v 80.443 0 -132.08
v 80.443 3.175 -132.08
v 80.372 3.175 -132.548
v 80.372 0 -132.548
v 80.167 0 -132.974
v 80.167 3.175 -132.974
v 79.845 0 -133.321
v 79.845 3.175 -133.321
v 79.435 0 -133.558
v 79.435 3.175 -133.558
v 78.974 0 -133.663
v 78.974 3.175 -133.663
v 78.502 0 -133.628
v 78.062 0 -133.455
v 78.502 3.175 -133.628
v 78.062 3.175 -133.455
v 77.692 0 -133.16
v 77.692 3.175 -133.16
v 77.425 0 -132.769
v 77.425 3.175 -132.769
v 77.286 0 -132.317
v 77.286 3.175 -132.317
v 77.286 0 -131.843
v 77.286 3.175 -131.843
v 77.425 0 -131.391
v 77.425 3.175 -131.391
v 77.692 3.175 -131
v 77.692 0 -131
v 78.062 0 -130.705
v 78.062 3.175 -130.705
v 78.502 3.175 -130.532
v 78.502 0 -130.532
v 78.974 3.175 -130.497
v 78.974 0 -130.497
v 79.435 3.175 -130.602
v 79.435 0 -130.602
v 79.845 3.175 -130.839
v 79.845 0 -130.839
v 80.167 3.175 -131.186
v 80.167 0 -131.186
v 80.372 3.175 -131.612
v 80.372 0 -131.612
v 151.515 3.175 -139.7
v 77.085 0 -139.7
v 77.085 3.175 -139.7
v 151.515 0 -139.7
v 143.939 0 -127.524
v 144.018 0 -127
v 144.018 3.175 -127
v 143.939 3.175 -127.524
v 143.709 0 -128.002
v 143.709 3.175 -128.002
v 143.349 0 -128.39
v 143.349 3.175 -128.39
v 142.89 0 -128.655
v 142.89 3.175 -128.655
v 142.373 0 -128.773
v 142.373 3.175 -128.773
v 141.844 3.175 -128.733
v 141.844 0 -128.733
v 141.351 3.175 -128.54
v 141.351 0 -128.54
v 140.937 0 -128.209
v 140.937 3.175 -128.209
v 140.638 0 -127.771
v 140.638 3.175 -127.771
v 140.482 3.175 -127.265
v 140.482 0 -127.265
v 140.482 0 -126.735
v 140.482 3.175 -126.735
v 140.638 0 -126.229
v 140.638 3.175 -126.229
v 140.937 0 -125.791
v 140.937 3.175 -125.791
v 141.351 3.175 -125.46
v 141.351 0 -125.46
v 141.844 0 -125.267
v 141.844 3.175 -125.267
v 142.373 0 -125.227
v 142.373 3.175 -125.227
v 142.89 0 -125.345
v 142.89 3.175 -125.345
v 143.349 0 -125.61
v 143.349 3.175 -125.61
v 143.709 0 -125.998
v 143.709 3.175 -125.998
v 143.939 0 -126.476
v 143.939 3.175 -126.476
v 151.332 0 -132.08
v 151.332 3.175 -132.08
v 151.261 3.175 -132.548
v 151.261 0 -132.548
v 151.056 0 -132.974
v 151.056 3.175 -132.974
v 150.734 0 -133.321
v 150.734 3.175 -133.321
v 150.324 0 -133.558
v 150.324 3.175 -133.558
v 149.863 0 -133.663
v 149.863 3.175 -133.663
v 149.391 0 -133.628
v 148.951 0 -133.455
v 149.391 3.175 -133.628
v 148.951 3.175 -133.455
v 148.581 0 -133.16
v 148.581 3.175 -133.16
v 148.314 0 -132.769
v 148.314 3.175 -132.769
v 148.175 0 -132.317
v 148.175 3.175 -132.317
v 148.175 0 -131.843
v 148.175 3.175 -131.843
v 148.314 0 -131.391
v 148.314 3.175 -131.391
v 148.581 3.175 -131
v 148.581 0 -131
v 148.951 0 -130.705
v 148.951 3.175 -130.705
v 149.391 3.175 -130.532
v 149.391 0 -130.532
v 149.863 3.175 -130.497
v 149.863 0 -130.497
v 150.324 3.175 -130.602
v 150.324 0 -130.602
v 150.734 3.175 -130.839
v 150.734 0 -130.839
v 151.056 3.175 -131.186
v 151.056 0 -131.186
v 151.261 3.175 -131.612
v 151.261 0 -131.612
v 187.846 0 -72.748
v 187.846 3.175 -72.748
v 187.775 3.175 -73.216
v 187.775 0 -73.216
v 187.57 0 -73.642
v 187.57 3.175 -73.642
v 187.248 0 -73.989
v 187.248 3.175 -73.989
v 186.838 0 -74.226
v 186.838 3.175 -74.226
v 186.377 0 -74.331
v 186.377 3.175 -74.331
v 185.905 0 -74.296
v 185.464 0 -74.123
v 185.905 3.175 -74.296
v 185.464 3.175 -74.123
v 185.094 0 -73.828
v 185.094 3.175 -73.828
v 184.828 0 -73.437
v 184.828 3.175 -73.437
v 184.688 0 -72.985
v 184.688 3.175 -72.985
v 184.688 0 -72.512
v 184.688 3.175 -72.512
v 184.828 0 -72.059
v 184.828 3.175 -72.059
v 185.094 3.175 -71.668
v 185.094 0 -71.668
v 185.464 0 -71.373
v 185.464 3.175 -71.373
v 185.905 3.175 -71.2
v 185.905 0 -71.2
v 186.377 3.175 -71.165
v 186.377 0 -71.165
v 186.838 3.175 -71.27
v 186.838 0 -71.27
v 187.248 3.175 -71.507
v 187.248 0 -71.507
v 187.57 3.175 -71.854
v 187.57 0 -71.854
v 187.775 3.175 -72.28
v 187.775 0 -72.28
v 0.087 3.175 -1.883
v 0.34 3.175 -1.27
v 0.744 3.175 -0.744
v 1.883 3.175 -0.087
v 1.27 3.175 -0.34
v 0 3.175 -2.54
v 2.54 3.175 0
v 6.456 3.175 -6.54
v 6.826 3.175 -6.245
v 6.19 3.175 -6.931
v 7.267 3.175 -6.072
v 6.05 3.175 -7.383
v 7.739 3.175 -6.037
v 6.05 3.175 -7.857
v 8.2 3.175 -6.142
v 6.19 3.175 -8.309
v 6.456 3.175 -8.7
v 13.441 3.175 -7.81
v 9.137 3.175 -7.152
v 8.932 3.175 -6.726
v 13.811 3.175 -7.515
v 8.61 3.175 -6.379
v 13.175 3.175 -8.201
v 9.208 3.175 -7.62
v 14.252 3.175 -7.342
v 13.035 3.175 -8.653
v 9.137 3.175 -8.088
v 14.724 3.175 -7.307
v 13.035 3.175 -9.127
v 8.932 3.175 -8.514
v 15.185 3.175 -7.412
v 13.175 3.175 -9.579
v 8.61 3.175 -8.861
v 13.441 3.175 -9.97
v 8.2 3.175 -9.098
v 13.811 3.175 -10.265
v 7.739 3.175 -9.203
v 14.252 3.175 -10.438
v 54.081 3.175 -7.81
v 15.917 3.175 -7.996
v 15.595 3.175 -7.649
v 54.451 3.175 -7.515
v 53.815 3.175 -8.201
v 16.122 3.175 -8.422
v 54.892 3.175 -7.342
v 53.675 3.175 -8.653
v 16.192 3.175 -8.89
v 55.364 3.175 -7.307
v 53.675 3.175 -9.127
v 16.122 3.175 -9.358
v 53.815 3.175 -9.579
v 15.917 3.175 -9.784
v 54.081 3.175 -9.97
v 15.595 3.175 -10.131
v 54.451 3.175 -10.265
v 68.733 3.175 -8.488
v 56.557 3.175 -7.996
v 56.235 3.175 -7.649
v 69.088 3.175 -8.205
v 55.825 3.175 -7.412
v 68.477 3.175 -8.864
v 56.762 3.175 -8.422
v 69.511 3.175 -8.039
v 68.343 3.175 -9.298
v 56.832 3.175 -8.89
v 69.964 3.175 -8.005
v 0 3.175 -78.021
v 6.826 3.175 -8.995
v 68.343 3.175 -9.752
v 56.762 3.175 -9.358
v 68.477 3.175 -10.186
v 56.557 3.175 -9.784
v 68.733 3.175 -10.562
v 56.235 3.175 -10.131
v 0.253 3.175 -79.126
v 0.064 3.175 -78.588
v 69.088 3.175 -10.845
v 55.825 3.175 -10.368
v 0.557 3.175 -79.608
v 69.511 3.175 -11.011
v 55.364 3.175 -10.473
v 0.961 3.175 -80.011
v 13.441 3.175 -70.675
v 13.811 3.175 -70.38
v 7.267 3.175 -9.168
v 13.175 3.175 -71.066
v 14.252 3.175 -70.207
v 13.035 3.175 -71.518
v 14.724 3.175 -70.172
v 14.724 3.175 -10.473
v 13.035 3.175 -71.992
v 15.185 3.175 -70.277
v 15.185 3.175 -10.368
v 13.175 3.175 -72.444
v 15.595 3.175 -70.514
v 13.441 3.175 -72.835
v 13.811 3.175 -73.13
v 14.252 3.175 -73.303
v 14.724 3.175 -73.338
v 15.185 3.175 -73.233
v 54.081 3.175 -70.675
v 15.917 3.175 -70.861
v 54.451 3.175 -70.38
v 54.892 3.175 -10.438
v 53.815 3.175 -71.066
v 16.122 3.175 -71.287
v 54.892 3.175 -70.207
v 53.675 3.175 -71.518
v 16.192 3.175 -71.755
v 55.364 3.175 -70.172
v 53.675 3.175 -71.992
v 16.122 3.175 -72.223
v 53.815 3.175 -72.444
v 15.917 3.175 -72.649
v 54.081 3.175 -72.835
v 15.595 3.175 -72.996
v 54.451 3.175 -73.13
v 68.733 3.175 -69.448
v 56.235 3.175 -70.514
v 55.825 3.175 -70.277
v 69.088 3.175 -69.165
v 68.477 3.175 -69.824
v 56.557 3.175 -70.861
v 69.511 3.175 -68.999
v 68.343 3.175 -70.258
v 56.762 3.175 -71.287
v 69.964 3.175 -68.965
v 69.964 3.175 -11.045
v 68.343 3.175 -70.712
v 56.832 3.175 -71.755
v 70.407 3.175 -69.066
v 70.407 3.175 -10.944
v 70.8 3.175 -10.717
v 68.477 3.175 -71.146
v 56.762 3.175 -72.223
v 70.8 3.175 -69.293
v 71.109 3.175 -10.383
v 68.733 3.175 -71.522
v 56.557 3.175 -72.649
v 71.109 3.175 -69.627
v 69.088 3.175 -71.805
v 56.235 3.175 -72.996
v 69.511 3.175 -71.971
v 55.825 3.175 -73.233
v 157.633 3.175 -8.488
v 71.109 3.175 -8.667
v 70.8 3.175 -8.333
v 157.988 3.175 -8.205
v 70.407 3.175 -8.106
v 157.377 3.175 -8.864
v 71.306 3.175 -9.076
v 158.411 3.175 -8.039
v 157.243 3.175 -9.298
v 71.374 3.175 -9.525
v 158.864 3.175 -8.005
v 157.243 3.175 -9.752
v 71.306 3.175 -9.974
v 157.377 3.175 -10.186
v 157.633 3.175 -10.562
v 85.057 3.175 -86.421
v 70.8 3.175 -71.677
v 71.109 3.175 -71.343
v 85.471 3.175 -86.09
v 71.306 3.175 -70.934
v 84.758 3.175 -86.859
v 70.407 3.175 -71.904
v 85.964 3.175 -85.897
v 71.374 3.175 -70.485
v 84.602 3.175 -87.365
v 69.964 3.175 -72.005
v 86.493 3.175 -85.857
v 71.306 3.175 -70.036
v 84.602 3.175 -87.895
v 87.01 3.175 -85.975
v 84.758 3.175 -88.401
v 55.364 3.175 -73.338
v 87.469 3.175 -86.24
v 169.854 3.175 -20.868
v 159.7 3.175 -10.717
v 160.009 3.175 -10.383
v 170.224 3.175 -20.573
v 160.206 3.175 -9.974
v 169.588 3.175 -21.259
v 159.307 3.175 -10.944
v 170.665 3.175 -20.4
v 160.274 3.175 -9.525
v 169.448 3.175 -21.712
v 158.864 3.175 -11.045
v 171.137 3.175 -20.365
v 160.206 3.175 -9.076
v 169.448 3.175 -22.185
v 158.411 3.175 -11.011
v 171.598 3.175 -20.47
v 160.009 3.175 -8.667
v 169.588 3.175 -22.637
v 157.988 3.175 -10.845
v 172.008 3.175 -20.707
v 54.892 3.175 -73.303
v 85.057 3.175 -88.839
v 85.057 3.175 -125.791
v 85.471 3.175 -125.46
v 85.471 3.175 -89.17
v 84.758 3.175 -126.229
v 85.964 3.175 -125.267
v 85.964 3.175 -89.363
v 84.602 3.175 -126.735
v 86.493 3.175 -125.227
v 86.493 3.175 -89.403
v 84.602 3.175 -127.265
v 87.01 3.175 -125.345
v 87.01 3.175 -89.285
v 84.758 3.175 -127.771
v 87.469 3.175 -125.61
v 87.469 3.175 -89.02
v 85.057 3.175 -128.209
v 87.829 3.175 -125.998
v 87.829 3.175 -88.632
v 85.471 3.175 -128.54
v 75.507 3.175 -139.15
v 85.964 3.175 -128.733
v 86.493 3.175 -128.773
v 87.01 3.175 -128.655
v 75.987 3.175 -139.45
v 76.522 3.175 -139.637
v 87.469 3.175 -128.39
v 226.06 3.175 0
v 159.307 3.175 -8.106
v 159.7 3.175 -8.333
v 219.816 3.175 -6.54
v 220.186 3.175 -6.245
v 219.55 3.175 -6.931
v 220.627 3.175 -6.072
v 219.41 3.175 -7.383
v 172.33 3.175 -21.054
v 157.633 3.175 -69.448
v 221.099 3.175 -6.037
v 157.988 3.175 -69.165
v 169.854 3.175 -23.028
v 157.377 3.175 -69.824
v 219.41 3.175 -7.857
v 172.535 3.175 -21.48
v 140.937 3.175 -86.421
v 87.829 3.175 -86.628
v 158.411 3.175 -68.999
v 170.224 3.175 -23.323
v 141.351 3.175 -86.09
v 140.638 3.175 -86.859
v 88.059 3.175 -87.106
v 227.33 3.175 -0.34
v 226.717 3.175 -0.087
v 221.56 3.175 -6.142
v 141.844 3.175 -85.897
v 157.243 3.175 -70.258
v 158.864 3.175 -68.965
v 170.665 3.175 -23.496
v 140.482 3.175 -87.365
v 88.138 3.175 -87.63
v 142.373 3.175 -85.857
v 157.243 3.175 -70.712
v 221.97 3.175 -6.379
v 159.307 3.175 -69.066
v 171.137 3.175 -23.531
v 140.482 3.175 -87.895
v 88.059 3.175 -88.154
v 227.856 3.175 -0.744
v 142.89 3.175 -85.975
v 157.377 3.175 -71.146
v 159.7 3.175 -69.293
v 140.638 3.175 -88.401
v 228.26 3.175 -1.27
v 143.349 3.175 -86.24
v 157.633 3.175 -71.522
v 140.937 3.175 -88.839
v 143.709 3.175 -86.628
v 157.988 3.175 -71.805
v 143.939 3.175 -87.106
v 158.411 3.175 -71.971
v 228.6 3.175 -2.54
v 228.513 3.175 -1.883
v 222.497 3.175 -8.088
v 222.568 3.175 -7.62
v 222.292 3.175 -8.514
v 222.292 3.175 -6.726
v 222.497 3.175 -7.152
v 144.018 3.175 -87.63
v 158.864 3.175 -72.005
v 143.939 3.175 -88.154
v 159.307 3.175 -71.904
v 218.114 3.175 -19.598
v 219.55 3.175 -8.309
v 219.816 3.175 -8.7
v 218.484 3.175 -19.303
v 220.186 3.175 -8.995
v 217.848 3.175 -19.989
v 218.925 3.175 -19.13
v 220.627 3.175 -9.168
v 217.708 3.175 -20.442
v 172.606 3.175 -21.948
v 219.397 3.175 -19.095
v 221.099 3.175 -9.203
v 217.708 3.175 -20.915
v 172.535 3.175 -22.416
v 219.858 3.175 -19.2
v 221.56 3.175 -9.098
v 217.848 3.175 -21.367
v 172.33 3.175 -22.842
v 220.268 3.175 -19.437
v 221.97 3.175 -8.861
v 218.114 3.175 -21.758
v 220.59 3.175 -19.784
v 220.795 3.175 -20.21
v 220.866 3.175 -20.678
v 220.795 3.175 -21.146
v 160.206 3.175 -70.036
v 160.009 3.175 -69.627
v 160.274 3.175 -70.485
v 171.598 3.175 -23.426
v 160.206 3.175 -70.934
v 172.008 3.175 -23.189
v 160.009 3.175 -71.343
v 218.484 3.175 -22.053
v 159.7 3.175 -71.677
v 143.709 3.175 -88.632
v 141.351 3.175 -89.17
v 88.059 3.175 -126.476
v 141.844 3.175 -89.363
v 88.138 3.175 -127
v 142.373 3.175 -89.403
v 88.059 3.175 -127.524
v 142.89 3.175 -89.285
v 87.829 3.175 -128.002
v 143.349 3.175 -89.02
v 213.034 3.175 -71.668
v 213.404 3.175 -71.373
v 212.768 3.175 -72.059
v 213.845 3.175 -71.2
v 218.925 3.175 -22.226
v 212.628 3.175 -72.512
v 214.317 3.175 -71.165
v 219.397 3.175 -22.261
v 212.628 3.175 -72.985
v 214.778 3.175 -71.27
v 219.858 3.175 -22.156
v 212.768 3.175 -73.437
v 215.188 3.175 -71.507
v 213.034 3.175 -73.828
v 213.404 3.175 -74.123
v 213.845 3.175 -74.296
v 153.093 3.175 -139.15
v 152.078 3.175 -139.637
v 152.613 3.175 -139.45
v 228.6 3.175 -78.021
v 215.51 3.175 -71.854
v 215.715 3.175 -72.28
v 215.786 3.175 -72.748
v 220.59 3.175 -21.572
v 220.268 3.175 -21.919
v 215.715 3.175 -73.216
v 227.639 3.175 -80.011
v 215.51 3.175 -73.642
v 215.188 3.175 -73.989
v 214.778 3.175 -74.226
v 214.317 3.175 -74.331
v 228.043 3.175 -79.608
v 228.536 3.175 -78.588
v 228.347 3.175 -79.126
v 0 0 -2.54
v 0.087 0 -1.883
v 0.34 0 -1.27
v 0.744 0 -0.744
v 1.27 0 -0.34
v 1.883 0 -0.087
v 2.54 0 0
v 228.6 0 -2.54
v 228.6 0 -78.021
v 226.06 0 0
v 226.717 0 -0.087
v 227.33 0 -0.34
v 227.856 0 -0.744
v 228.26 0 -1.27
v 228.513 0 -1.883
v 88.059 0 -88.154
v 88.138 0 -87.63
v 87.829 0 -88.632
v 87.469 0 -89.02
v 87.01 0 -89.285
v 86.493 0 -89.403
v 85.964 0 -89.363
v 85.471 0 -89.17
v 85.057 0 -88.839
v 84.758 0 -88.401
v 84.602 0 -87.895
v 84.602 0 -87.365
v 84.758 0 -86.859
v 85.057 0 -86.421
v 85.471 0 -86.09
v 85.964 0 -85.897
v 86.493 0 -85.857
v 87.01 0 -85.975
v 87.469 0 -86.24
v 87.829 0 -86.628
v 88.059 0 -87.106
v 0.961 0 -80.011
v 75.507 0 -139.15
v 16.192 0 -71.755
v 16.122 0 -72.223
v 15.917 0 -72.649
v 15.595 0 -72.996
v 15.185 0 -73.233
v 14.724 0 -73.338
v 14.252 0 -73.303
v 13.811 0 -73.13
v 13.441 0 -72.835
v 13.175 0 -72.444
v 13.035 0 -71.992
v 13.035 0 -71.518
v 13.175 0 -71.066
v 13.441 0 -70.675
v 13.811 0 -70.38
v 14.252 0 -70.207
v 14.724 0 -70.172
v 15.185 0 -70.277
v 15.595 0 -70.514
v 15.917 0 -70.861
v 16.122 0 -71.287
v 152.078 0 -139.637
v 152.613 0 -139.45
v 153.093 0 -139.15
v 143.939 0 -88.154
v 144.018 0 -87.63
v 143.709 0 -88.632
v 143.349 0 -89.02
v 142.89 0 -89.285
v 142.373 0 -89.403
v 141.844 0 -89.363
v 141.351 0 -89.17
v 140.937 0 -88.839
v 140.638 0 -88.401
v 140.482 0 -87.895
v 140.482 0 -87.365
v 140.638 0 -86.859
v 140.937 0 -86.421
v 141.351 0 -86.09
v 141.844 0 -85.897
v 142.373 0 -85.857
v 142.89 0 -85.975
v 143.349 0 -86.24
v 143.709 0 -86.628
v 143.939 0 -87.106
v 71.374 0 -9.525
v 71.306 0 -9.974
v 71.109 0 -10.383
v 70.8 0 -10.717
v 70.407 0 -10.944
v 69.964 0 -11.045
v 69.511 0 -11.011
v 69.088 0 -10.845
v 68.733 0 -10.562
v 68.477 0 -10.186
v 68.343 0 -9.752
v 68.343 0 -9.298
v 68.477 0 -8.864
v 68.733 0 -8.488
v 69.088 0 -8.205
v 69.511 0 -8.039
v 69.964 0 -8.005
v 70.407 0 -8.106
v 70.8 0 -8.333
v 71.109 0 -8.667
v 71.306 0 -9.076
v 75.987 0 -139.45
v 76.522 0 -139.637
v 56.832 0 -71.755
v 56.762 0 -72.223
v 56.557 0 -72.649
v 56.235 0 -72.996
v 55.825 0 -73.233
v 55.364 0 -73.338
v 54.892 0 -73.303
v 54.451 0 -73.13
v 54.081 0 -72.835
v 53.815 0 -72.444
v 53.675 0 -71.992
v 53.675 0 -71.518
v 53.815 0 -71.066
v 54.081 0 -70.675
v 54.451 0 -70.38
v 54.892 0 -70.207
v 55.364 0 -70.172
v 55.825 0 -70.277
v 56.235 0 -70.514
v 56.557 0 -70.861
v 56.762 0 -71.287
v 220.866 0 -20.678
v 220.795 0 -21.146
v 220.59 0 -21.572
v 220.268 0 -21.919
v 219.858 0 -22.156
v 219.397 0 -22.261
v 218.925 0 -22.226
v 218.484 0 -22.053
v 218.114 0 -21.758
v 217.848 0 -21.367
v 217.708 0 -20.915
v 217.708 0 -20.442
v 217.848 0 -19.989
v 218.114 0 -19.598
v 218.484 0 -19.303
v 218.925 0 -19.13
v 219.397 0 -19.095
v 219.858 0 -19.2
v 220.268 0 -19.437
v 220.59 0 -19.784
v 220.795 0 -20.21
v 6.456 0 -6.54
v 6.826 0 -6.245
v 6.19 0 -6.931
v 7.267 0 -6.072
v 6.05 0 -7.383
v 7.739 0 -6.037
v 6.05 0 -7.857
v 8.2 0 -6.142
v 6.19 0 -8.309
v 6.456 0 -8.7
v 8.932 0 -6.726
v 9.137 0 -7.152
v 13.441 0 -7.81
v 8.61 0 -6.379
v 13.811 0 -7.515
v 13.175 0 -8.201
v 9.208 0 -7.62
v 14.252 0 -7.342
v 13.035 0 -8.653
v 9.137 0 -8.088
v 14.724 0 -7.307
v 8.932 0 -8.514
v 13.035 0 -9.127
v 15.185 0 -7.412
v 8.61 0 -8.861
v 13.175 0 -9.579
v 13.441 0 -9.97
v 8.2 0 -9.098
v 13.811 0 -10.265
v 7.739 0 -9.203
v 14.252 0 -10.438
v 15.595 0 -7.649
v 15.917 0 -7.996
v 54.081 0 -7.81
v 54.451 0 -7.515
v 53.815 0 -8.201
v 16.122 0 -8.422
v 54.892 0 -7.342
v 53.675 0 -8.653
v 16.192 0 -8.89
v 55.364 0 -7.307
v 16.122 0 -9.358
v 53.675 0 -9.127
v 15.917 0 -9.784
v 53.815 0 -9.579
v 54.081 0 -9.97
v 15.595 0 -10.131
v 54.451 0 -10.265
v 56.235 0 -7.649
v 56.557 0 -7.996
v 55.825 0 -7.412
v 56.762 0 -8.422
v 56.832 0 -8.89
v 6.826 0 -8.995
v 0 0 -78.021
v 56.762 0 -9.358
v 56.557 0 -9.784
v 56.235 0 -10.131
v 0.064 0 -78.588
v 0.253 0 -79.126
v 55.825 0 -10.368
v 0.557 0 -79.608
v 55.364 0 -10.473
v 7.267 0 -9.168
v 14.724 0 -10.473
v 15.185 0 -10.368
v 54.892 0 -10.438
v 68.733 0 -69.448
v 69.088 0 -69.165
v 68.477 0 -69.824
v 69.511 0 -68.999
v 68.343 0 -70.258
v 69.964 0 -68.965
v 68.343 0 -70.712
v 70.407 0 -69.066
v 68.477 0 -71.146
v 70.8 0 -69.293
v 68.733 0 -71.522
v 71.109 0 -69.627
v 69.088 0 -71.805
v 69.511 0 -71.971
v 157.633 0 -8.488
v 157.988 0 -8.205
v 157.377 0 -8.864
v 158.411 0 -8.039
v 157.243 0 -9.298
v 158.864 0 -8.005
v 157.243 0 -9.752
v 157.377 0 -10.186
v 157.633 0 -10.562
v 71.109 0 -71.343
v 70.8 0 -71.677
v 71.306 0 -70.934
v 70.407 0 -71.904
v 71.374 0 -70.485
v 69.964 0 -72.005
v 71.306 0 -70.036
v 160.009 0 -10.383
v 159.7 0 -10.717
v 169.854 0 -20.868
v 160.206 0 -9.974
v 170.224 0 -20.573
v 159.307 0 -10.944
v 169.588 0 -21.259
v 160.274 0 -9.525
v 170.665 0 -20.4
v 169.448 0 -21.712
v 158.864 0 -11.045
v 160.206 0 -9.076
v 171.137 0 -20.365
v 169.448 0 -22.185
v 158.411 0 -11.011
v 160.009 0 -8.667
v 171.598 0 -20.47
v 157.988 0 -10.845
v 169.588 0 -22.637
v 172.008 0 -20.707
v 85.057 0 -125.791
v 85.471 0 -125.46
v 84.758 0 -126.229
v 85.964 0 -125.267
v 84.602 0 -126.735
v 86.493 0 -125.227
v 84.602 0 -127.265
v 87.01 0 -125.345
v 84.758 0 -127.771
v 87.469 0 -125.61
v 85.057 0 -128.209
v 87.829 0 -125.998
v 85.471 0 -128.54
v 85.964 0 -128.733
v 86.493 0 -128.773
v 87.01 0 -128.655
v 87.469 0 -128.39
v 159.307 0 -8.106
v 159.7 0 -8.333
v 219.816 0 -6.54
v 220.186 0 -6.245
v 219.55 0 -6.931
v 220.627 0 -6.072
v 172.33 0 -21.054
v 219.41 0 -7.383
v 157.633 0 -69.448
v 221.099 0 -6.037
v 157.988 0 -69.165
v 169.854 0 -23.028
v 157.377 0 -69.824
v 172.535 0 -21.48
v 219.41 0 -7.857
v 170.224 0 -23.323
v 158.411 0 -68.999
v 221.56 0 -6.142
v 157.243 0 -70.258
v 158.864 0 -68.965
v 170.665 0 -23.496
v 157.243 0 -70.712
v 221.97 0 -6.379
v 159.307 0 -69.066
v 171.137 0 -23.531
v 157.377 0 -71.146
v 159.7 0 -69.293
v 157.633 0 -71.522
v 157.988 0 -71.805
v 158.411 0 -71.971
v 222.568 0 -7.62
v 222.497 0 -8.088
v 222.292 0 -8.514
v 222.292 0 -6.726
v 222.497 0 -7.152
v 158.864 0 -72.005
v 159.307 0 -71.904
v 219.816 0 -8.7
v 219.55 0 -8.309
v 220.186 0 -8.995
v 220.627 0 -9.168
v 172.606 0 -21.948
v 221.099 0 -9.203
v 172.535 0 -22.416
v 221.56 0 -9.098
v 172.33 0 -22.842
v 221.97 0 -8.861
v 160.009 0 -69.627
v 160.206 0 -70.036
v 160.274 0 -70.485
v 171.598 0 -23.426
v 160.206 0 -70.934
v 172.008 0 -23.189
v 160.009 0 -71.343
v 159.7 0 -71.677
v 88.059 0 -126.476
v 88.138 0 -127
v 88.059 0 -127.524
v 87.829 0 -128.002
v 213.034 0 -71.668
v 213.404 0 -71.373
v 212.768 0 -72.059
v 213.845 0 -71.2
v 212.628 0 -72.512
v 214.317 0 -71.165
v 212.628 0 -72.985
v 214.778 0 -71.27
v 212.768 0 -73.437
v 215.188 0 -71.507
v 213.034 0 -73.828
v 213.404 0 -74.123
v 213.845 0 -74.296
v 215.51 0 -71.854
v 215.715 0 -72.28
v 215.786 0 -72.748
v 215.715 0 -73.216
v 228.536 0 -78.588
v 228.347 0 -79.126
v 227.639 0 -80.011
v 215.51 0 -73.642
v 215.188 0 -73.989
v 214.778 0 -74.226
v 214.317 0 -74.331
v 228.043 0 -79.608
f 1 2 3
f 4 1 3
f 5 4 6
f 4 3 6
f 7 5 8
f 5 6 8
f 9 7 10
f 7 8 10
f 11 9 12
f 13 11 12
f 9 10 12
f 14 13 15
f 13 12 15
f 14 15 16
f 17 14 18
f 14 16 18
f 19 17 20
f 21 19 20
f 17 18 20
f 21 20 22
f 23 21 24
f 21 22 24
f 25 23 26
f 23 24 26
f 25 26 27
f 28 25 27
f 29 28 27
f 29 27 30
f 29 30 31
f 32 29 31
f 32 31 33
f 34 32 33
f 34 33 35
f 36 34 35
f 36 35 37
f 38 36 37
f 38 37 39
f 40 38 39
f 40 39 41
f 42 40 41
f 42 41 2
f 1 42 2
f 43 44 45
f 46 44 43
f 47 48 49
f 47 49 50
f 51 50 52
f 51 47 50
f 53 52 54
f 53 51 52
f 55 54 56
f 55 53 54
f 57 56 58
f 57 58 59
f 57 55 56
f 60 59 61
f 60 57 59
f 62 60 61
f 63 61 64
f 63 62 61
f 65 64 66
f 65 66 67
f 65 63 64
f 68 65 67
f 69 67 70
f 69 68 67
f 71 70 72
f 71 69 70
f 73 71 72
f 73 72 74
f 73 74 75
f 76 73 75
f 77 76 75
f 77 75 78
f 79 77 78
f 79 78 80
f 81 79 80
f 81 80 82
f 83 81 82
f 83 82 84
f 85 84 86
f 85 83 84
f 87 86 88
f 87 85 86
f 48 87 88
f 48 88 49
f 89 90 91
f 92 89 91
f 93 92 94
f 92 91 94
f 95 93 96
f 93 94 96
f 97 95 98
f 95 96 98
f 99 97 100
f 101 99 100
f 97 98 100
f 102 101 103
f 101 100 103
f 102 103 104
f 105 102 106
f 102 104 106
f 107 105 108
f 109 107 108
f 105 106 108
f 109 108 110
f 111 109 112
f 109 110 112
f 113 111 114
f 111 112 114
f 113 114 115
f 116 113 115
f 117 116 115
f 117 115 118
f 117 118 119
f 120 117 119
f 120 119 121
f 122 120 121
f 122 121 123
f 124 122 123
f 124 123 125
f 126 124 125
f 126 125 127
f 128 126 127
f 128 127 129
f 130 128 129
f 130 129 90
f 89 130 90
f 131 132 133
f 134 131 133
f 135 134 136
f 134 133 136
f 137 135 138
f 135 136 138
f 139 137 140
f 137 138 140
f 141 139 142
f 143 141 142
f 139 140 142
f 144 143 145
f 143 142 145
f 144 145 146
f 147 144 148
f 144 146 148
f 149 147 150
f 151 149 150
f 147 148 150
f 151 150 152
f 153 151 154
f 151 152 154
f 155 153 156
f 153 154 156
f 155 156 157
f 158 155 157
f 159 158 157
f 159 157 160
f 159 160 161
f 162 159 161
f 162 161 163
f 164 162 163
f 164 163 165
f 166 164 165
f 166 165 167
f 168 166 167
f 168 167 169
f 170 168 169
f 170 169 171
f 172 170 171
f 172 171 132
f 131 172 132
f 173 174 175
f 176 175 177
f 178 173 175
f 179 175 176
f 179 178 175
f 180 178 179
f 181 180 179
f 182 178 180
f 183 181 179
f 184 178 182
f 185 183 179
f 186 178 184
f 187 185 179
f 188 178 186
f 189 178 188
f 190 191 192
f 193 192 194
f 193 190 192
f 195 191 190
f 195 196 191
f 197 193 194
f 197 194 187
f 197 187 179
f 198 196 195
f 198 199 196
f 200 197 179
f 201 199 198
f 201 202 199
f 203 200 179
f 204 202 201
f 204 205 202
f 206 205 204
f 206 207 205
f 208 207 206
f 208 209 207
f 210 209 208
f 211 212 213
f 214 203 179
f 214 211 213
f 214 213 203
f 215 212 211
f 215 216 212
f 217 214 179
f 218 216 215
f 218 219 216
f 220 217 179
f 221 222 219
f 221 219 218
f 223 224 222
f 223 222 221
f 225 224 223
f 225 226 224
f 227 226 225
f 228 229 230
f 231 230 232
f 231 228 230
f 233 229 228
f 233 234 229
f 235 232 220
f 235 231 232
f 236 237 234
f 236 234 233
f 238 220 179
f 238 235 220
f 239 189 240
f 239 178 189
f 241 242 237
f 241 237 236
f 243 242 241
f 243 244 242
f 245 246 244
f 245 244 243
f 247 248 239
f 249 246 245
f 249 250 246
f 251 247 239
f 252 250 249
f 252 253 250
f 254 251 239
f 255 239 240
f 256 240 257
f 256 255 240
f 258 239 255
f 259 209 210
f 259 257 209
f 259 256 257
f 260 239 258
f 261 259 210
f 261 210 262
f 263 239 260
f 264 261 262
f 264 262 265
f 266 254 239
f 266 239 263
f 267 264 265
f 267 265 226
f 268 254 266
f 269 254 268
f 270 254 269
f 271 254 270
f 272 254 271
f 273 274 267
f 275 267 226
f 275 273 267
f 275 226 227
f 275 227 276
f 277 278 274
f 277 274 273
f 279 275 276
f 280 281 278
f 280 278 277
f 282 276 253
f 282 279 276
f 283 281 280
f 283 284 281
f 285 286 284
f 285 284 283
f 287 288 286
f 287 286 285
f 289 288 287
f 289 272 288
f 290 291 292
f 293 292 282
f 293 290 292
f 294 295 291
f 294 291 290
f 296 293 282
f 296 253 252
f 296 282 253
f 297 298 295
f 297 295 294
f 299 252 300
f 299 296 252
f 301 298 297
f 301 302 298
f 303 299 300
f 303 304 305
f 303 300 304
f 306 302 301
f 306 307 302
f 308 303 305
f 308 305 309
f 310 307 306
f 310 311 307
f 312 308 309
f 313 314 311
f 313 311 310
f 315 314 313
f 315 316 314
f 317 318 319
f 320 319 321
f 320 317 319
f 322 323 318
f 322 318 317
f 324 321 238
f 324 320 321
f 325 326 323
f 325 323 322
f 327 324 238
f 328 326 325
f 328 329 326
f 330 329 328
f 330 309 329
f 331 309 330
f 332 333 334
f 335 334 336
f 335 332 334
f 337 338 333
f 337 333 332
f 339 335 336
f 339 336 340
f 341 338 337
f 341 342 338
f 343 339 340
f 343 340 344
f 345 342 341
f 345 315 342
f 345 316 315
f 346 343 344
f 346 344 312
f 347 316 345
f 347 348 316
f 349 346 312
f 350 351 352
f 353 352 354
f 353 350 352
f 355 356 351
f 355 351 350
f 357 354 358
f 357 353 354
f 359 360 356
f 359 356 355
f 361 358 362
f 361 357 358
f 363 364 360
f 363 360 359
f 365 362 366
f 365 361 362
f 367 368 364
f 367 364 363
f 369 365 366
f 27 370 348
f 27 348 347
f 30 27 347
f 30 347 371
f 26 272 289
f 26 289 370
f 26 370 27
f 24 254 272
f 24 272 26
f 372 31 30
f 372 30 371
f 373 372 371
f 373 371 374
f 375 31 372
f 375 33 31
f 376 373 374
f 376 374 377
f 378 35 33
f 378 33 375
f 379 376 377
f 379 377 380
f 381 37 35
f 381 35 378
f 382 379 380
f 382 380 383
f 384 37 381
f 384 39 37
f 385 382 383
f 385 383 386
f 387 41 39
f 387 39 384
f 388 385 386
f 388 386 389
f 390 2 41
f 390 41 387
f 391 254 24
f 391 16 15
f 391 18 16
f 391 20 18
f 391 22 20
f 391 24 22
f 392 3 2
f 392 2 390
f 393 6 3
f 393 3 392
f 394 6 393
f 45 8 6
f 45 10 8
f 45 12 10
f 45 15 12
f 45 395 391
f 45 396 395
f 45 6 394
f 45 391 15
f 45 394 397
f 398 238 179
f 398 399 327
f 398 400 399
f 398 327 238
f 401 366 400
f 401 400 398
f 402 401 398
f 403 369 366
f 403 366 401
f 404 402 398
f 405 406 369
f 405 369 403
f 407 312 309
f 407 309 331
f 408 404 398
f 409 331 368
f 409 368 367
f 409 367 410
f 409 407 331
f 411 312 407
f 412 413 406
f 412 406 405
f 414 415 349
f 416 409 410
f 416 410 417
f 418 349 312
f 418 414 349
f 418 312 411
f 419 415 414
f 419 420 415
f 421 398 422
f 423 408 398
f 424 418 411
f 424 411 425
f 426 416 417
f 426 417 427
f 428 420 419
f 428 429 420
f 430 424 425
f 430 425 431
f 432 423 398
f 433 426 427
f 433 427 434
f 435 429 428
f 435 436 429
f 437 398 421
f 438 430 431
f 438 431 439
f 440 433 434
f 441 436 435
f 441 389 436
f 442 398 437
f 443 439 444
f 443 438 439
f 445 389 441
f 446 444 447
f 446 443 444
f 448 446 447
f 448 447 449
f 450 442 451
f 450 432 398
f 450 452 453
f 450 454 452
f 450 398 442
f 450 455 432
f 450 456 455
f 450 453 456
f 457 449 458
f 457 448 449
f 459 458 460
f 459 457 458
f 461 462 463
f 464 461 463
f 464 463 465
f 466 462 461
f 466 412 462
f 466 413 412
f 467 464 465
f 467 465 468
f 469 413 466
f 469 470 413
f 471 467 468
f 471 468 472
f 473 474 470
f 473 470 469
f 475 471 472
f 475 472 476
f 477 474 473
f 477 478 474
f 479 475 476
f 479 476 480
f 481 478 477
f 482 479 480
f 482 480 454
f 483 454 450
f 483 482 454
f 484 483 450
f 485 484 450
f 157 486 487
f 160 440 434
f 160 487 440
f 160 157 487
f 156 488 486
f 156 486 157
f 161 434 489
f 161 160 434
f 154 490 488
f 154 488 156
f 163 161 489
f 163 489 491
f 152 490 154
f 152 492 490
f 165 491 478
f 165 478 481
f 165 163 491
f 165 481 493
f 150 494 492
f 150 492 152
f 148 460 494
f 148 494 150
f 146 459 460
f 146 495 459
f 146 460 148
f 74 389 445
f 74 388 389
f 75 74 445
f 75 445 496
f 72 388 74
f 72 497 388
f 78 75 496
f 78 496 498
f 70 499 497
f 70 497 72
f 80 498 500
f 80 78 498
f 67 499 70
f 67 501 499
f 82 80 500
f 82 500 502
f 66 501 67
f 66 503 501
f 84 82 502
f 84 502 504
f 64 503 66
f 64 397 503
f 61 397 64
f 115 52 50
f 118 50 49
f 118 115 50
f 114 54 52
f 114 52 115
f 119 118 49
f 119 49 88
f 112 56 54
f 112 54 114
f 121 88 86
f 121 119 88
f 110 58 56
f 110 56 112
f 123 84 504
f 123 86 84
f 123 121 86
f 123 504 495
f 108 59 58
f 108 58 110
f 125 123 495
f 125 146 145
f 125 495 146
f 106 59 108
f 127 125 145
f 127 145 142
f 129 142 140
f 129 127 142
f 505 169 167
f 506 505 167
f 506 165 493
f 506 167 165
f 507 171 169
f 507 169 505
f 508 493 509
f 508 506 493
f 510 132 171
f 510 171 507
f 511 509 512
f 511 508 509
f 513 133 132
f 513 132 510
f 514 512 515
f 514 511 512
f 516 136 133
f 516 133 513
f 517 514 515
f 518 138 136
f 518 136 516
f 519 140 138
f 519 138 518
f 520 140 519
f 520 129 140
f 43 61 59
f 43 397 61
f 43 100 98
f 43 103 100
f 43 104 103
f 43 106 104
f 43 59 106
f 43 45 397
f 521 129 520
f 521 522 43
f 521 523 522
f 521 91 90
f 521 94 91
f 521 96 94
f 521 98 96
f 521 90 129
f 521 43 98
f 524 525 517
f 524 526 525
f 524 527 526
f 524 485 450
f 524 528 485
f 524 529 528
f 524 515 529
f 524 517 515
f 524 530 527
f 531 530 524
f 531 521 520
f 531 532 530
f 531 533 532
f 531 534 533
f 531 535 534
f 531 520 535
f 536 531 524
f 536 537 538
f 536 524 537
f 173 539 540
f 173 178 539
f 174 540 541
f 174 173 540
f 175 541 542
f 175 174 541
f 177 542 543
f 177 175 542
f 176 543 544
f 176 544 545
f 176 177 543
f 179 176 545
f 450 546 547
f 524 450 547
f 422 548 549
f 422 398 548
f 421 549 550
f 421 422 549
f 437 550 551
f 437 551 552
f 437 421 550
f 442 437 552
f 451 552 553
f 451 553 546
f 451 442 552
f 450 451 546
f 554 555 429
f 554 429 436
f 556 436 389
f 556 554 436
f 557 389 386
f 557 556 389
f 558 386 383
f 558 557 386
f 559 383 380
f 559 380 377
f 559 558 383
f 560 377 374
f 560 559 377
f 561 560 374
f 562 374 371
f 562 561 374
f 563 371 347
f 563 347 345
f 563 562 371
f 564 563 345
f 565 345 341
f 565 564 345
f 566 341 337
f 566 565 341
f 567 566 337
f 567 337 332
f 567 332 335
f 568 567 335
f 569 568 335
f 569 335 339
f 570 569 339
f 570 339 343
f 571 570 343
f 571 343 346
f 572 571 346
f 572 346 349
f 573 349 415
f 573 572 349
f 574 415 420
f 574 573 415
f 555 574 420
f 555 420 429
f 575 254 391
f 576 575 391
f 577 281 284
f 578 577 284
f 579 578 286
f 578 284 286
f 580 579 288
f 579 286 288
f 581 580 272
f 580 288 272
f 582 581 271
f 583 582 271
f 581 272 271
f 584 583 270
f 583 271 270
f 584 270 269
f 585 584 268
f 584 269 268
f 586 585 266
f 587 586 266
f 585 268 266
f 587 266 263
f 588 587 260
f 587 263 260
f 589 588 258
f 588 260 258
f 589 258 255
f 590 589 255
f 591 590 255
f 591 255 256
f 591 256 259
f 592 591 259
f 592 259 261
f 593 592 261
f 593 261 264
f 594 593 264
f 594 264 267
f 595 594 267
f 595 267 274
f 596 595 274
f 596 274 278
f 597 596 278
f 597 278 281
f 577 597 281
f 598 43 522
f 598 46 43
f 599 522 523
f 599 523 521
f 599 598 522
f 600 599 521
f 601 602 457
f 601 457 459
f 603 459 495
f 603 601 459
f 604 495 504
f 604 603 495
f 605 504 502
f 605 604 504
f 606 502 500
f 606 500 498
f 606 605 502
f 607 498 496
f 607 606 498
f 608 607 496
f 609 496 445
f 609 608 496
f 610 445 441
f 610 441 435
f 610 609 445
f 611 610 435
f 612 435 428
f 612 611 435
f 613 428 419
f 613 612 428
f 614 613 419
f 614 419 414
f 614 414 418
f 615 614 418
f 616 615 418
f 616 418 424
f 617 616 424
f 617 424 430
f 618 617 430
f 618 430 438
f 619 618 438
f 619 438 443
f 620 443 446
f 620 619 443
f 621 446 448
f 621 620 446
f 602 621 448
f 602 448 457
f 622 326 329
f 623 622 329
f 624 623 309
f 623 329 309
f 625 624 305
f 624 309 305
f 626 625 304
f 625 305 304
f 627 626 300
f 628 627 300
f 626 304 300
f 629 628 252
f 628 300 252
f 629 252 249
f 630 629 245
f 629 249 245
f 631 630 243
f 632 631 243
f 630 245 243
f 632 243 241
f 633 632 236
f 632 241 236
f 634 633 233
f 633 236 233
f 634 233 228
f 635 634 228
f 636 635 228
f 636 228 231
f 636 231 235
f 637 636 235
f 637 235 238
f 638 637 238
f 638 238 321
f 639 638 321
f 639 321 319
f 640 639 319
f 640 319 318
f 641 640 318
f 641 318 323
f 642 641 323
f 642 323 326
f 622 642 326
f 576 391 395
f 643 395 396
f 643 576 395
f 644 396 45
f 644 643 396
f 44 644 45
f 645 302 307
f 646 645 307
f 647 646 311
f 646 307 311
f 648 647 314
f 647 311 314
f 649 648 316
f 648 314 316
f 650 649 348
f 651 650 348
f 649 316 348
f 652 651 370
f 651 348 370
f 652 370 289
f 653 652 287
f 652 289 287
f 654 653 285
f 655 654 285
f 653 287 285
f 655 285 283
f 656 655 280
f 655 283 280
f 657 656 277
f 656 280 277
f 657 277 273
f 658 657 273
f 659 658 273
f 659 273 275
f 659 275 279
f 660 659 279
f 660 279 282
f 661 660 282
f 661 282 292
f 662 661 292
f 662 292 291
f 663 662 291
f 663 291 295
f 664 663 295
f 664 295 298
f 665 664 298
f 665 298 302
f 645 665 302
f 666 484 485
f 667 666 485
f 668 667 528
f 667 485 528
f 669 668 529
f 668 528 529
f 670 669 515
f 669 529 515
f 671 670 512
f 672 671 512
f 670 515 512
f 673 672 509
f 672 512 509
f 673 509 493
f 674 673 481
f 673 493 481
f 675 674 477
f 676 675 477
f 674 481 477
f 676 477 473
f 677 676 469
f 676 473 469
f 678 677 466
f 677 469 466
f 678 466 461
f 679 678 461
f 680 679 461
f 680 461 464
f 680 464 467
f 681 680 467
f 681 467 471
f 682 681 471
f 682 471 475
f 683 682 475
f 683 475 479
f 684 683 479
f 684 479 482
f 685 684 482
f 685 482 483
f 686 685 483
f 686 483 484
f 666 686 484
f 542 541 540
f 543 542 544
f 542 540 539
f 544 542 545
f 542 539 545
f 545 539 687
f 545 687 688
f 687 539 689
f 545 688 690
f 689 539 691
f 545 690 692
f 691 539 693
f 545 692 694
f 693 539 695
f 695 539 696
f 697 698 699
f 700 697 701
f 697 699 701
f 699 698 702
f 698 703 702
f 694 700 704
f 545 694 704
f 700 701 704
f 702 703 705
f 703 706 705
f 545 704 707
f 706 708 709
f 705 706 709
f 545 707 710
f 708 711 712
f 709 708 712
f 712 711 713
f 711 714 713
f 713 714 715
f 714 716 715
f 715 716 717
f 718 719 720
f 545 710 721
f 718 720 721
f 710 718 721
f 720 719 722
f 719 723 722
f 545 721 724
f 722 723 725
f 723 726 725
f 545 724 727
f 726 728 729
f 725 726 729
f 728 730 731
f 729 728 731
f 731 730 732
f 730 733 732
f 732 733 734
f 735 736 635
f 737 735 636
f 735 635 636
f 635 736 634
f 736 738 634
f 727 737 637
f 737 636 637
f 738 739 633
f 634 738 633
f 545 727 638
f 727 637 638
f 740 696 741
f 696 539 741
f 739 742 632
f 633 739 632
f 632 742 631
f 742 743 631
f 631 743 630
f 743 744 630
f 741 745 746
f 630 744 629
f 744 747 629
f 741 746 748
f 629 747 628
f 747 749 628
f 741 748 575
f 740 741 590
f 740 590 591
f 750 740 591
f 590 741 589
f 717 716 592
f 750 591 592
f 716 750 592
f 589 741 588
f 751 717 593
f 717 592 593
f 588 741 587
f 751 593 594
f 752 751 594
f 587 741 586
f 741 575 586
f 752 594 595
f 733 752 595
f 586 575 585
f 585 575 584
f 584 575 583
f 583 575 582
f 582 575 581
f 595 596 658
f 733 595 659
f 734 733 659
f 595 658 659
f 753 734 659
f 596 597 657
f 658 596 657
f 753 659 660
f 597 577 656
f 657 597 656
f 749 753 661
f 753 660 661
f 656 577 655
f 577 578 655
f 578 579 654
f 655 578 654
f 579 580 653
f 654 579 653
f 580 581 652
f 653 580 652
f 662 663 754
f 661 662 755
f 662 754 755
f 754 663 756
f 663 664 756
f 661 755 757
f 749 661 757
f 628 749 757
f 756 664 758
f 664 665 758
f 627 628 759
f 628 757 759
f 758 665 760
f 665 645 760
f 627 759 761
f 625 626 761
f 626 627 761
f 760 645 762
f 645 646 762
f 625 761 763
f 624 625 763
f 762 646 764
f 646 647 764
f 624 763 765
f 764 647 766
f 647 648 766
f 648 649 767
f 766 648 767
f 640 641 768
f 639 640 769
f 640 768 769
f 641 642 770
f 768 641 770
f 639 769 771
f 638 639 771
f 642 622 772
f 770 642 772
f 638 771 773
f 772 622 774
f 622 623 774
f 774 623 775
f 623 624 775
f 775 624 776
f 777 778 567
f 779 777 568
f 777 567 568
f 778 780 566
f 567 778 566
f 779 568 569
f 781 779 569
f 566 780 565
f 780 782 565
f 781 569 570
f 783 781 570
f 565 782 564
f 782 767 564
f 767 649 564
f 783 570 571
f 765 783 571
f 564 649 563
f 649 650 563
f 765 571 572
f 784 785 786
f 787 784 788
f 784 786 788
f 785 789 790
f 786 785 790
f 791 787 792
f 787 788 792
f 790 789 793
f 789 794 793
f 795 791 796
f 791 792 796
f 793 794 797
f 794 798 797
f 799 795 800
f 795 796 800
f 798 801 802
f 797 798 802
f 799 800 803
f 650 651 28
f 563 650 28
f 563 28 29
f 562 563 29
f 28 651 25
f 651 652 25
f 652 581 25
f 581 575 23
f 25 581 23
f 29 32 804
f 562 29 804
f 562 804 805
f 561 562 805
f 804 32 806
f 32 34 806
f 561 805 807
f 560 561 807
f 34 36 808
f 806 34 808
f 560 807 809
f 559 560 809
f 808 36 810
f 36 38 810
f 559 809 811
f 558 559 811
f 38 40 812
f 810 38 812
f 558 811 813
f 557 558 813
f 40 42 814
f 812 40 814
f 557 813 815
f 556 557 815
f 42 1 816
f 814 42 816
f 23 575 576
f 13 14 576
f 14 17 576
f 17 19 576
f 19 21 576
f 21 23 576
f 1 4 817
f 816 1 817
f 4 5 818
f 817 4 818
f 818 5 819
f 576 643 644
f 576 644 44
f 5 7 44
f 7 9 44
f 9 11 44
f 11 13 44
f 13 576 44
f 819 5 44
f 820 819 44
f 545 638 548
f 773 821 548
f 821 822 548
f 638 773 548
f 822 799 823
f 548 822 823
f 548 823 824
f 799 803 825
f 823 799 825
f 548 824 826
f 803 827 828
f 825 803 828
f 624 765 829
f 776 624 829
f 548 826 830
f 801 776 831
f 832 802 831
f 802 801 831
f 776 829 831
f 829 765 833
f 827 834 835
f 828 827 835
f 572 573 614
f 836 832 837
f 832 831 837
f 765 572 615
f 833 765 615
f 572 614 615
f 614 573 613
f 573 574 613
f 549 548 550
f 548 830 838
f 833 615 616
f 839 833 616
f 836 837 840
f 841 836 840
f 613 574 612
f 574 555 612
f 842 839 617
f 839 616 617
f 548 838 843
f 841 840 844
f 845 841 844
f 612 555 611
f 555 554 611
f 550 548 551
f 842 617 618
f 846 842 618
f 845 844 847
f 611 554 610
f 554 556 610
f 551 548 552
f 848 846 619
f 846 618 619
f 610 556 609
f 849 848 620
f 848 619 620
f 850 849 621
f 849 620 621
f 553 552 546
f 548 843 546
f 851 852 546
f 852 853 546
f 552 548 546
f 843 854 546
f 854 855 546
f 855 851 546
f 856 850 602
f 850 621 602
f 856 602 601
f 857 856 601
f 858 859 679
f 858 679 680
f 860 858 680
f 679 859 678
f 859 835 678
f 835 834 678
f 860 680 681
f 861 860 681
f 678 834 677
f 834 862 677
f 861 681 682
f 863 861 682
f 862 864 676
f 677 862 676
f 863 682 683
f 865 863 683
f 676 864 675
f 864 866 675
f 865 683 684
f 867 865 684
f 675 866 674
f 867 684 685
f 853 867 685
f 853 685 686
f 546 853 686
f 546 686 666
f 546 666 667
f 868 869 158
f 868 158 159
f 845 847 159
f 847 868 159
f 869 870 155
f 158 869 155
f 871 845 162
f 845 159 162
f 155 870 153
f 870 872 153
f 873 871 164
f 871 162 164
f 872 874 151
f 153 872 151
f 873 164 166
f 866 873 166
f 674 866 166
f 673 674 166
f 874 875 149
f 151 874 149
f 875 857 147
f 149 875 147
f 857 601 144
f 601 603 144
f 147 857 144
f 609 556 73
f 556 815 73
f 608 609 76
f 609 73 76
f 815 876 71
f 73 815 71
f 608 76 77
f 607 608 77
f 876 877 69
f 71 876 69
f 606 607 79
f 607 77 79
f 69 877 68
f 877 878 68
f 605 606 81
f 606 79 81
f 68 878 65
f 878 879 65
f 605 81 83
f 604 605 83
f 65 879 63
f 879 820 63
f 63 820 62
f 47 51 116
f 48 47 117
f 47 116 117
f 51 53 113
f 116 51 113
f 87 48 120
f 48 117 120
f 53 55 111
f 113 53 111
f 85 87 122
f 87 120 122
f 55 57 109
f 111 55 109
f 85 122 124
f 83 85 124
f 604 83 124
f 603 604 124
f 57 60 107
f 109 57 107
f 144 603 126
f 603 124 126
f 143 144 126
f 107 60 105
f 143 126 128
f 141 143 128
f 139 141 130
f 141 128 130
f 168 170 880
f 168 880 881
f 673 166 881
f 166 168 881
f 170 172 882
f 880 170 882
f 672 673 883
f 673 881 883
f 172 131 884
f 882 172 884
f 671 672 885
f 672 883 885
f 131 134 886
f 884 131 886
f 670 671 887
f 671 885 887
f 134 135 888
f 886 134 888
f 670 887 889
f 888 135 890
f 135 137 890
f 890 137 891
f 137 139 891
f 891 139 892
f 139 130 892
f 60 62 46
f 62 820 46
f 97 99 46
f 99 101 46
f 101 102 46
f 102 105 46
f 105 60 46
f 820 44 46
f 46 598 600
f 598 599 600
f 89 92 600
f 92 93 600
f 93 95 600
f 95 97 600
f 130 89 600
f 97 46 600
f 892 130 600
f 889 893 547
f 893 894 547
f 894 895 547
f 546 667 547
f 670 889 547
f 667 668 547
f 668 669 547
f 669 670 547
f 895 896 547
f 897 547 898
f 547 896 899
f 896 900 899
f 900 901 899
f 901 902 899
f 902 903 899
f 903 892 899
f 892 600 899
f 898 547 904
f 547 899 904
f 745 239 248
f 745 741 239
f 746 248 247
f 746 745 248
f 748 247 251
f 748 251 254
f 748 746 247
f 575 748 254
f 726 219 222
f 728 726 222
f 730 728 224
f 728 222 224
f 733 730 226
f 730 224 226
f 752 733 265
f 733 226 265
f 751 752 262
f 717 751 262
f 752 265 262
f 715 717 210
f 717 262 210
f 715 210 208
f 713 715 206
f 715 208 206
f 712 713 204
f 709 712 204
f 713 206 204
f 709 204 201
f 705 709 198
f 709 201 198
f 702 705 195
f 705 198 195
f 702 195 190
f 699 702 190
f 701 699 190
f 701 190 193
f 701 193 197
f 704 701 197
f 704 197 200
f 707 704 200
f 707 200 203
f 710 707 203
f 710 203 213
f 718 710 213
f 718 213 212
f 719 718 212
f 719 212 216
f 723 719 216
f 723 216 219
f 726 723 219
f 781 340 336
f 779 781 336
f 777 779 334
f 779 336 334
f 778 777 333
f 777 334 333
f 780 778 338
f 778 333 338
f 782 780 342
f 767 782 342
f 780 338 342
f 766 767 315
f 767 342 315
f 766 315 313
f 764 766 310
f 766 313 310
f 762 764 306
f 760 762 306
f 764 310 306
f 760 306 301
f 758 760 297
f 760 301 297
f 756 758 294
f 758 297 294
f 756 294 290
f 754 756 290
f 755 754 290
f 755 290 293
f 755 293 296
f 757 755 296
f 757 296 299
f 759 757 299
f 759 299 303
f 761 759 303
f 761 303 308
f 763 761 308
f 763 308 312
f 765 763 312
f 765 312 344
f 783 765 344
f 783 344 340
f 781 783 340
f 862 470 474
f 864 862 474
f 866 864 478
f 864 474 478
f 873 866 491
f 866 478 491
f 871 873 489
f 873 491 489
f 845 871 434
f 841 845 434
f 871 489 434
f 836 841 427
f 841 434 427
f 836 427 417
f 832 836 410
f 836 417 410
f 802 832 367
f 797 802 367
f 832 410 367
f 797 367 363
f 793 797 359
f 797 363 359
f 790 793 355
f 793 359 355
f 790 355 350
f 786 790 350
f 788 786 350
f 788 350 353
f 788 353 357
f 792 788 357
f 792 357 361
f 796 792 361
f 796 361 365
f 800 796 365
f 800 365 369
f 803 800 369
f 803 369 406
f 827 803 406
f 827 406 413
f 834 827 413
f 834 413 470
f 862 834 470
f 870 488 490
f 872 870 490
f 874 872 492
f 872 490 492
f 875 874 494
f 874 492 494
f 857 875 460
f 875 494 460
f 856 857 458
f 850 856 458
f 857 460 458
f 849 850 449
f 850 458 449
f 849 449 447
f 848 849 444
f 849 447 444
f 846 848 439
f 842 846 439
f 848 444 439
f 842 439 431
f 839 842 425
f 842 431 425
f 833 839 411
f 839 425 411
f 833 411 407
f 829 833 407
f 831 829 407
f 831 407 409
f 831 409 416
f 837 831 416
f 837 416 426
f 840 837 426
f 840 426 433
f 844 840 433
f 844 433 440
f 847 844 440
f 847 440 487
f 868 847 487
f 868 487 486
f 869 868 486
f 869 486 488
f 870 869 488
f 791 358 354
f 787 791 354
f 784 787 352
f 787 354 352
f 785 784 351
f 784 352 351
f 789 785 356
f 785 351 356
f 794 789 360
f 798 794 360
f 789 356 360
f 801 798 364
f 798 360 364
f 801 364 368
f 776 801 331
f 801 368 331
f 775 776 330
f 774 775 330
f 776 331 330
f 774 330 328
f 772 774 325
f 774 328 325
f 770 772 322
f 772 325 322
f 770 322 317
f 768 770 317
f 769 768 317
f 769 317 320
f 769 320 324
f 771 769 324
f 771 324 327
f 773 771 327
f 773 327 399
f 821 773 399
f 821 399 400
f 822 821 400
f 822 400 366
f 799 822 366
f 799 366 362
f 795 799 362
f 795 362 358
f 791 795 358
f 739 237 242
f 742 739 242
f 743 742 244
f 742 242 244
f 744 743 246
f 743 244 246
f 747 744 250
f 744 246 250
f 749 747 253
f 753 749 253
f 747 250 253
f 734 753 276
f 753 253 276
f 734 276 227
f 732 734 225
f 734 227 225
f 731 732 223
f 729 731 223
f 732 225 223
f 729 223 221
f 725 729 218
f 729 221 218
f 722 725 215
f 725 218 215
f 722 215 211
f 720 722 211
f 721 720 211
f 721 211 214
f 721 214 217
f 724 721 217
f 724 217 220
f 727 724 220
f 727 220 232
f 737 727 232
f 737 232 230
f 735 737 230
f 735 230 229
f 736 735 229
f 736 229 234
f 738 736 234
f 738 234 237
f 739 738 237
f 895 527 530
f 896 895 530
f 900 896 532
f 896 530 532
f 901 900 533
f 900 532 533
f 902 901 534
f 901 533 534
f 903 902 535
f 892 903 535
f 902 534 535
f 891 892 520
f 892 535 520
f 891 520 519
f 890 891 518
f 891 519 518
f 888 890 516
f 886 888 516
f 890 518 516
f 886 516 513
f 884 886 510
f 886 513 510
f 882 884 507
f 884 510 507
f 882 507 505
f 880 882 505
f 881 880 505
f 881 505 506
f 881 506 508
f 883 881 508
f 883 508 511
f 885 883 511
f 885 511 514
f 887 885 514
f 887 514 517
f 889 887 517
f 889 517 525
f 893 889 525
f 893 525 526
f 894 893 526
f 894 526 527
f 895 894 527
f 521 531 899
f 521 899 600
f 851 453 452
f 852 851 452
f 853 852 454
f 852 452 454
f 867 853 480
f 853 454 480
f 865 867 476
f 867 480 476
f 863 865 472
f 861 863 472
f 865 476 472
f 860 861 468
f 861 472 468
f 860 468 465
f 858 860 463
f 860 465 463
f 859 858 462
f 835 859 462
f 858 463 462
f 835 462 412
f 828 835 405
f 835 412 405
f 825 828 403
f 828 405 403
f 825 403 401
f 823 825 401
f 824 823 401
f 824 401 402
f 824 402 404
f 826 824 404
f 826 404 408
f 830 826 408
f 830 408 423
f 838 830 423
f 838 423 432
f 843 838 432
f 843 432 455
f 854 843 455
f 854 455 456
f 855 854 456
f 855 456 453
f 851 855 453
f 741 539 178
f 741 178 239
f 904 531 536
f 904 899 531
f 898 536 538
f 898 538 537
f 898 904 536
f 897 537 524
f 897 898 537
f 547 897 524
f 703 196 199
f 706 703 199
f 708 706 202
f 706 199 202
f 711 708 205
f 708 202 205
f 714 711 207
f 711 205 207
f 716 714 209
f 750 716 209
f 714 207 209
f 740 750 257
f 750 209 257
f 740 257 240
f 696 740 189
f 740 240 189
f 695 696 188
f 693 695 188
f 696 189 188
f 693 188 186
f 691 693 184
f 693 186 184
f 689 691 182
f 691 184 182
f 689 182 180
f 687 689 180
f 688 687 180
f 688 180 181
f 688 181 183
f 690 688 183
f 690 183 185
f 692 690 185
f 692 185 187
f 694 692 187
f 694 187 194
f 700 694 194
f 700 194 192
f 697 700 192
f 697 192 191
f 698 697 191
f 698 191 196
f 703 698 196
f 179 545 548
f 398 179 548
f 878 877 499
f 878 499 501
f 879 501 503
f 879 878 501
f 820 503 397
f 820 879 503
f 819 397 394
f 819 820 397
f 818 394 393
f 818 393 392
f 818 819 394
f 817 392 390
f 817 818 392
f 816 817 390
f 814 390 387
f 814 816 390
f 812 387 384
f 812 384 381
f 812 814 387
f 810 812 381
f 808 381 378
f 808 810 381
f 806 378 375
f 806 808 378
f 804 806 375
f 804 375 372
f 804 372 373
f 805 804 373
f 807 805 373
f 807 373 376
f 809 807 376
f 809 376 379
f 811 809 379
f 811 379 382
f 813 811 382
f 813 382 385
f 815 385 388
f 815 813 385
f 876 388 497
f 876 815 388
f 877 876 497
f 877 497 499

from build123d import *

# Parameters (mm, degrees)
SKETCH1_W           = 228.6
SKETCH1_H           = 139.7
SKETCH1_R           = 1.778
BOSS_EXTRUDE1_DEPTH = 3.175
SKETCH3_R           = 1.524
CUT_EXTRUDE1_DEPTH  = 4.175
SKETCH4_R           = 1.5875
CUT_EXTRUDE2_DEPTH  = 4.175
SKETCH5_R           = 1.5875
CUT_EXTRUDE3_DEPTH  = 4.175
CUT_EXTRUDE4_DEPTH  = 4.175
FILLET1_R           = 2.54
SKETCH7_R           = 1.5875
CUT_EXTRUDE5_DEPTH  = 4.175


with BuildPart() as part:
    # Sketch1 → Boss-Extrude1 (new body)
    with BuildSketch(Plane(origin=(0, 0, 0), x_dir=(1, 0, 0), z_dir=(0, 1, 0))):
        with Locations((114.3, 69.85)):
            Rectangle(SKETCH1_W, SKETCH1_H)
        with Locations((86.36, 127)):
            Circle(SKETCH1_R, mode=Mode.SUBTRACT)
        with Locations((142.24, 127)):
            Circle(SKETCH1_R, mode=Mode.SUBTRACT)
        with Locations((86.36, 87.63)):
            Circle(SKETCH1_R, mode=Mode.SUBTRACT)
        with Locations((142.24, 87.63)):
            Circle(SKETCH1_R, mode=Mode.SUBTRACT)
    extrude(amount=BOSS_EXTRUDE1_DEPTH)

    # Sketch3 → Cut-Extrude1 (cut, through all)
    with BuildSketch(Plane(origin=(0, 3.175, 0), x_dir=(1, 0, 0), z_dir=(0, 1, 0))):
        with Locations((69.85, 70.485)):
            Circle(SKETCH3_R)
        with Locations((158.75, 70.485)):
            Circle(SKETCH3_R)
        with Locations((158.75, 9.525)):
            Circle(SKETCH3_R)
        with Locations((69.85, 9.525)):
            Circle(SKETCH3_R)
    extrude(amount=-CUT_EXTRUDE1_DEPTH, mode=Mode.SUBTRACT)

    # Sketch4 → Cut-Extrude2 (cut, through all)
    with BuildSketch(Plane(origin=(0, 3.175, 0), x_dir=(1, 0, 0), z_dir=(0, 1, 0))):
        with Locations((171.0182, 21.94814)):
            Circle(SKETCH4_R)
        with Locations((186.2582, 72.74814)):
            Circle(SKETCH4_R)
        with Locations((214.1982, 72.74814)):
            Circle(SKETCH4_R)
        with Locations((219.2782, 20.67814)):
            Circle(SKETCH4_R)
    extrude(amount=-CUT_EXTRUDE2_DEPTH, mode=Mode.SUBTRACT)

    # Sketch5 → Cut-Extrude3 (cut, through all)
    with BuildSketch(Plane(origin=(0, 3.175, 0), x_dir=(1, 0, 0), z_dir=(0, 1, 0))):
        with Locations((14.605, 71.755)):
            Circle(SKETCH5_R)
        with Locations((55.245, 71.755)):
            Circle(SKETCH5_R)
        with Locations((55.245, 8.89)):
            Circle(SKETCH5_R)
        with Locations((14.605, 8.89)):
            Circle(SKETCH5_R)
    extrude(amount=-CUT_EXTRUDE3_DEPTH, mode=Mode.SUBTRACT)

    # Sketch6 → Cut-Extrude4 (cut, through all)
    with BuildSketch(Plane(origin=(0, 3.175, 0), x_dir=(1, 0, 0), z_dir=(0, 1, 0))):
        Polygon((228.6, 79.248), (152.4, 139.7), (228.6, 139.7), align=None)
        Polygon((76.2, 139.7), (0, 139.7), (0, 79.248), align=None)
    extrude(amount=-CUT_EXTRUDE4_DEPTH, mode=Mode.SUBTRACT)

    # Fillet1
    fillet1_edges = [part.edges().sort_by_distance(p)[0] for p in [
        (228.6, 1.5875, 0),
        (0, 1.5875, 0),
        (228.6, 1.5875, -79.248),
        (152.4, 1.5875, -139.7),
        (76.2, 1.5875, -139.7),
        (0, 1.5875, -79.248),
    ]]
    fillet(fillet1_edges, radius=FILLET1_R)

    # Sketch7 → Cut-Extrude5 (cut, through all)
    with BuildSketch(Plane(origin=(0, 3.175, 0), x_dir=(1, 0, 0), z_dir=(0, 1, 0))):
        with Locations((220.98, 7.62)):
            Circle(SKETCH7_R)
        with Locations((149.744486069, 132.08)):
            Circle(SKETCH7_R)
        with Locations((7.62, 7.62)):
            Circle(SKETCH7_R)
        with Locations((78.855513931, 132.08)):
            Circle(SKETCH7_R)
    extrude(amount=-CUT_EXTRUDE5_DEPTH, mode=Mode.SUBTRACT)


solid = part.part
